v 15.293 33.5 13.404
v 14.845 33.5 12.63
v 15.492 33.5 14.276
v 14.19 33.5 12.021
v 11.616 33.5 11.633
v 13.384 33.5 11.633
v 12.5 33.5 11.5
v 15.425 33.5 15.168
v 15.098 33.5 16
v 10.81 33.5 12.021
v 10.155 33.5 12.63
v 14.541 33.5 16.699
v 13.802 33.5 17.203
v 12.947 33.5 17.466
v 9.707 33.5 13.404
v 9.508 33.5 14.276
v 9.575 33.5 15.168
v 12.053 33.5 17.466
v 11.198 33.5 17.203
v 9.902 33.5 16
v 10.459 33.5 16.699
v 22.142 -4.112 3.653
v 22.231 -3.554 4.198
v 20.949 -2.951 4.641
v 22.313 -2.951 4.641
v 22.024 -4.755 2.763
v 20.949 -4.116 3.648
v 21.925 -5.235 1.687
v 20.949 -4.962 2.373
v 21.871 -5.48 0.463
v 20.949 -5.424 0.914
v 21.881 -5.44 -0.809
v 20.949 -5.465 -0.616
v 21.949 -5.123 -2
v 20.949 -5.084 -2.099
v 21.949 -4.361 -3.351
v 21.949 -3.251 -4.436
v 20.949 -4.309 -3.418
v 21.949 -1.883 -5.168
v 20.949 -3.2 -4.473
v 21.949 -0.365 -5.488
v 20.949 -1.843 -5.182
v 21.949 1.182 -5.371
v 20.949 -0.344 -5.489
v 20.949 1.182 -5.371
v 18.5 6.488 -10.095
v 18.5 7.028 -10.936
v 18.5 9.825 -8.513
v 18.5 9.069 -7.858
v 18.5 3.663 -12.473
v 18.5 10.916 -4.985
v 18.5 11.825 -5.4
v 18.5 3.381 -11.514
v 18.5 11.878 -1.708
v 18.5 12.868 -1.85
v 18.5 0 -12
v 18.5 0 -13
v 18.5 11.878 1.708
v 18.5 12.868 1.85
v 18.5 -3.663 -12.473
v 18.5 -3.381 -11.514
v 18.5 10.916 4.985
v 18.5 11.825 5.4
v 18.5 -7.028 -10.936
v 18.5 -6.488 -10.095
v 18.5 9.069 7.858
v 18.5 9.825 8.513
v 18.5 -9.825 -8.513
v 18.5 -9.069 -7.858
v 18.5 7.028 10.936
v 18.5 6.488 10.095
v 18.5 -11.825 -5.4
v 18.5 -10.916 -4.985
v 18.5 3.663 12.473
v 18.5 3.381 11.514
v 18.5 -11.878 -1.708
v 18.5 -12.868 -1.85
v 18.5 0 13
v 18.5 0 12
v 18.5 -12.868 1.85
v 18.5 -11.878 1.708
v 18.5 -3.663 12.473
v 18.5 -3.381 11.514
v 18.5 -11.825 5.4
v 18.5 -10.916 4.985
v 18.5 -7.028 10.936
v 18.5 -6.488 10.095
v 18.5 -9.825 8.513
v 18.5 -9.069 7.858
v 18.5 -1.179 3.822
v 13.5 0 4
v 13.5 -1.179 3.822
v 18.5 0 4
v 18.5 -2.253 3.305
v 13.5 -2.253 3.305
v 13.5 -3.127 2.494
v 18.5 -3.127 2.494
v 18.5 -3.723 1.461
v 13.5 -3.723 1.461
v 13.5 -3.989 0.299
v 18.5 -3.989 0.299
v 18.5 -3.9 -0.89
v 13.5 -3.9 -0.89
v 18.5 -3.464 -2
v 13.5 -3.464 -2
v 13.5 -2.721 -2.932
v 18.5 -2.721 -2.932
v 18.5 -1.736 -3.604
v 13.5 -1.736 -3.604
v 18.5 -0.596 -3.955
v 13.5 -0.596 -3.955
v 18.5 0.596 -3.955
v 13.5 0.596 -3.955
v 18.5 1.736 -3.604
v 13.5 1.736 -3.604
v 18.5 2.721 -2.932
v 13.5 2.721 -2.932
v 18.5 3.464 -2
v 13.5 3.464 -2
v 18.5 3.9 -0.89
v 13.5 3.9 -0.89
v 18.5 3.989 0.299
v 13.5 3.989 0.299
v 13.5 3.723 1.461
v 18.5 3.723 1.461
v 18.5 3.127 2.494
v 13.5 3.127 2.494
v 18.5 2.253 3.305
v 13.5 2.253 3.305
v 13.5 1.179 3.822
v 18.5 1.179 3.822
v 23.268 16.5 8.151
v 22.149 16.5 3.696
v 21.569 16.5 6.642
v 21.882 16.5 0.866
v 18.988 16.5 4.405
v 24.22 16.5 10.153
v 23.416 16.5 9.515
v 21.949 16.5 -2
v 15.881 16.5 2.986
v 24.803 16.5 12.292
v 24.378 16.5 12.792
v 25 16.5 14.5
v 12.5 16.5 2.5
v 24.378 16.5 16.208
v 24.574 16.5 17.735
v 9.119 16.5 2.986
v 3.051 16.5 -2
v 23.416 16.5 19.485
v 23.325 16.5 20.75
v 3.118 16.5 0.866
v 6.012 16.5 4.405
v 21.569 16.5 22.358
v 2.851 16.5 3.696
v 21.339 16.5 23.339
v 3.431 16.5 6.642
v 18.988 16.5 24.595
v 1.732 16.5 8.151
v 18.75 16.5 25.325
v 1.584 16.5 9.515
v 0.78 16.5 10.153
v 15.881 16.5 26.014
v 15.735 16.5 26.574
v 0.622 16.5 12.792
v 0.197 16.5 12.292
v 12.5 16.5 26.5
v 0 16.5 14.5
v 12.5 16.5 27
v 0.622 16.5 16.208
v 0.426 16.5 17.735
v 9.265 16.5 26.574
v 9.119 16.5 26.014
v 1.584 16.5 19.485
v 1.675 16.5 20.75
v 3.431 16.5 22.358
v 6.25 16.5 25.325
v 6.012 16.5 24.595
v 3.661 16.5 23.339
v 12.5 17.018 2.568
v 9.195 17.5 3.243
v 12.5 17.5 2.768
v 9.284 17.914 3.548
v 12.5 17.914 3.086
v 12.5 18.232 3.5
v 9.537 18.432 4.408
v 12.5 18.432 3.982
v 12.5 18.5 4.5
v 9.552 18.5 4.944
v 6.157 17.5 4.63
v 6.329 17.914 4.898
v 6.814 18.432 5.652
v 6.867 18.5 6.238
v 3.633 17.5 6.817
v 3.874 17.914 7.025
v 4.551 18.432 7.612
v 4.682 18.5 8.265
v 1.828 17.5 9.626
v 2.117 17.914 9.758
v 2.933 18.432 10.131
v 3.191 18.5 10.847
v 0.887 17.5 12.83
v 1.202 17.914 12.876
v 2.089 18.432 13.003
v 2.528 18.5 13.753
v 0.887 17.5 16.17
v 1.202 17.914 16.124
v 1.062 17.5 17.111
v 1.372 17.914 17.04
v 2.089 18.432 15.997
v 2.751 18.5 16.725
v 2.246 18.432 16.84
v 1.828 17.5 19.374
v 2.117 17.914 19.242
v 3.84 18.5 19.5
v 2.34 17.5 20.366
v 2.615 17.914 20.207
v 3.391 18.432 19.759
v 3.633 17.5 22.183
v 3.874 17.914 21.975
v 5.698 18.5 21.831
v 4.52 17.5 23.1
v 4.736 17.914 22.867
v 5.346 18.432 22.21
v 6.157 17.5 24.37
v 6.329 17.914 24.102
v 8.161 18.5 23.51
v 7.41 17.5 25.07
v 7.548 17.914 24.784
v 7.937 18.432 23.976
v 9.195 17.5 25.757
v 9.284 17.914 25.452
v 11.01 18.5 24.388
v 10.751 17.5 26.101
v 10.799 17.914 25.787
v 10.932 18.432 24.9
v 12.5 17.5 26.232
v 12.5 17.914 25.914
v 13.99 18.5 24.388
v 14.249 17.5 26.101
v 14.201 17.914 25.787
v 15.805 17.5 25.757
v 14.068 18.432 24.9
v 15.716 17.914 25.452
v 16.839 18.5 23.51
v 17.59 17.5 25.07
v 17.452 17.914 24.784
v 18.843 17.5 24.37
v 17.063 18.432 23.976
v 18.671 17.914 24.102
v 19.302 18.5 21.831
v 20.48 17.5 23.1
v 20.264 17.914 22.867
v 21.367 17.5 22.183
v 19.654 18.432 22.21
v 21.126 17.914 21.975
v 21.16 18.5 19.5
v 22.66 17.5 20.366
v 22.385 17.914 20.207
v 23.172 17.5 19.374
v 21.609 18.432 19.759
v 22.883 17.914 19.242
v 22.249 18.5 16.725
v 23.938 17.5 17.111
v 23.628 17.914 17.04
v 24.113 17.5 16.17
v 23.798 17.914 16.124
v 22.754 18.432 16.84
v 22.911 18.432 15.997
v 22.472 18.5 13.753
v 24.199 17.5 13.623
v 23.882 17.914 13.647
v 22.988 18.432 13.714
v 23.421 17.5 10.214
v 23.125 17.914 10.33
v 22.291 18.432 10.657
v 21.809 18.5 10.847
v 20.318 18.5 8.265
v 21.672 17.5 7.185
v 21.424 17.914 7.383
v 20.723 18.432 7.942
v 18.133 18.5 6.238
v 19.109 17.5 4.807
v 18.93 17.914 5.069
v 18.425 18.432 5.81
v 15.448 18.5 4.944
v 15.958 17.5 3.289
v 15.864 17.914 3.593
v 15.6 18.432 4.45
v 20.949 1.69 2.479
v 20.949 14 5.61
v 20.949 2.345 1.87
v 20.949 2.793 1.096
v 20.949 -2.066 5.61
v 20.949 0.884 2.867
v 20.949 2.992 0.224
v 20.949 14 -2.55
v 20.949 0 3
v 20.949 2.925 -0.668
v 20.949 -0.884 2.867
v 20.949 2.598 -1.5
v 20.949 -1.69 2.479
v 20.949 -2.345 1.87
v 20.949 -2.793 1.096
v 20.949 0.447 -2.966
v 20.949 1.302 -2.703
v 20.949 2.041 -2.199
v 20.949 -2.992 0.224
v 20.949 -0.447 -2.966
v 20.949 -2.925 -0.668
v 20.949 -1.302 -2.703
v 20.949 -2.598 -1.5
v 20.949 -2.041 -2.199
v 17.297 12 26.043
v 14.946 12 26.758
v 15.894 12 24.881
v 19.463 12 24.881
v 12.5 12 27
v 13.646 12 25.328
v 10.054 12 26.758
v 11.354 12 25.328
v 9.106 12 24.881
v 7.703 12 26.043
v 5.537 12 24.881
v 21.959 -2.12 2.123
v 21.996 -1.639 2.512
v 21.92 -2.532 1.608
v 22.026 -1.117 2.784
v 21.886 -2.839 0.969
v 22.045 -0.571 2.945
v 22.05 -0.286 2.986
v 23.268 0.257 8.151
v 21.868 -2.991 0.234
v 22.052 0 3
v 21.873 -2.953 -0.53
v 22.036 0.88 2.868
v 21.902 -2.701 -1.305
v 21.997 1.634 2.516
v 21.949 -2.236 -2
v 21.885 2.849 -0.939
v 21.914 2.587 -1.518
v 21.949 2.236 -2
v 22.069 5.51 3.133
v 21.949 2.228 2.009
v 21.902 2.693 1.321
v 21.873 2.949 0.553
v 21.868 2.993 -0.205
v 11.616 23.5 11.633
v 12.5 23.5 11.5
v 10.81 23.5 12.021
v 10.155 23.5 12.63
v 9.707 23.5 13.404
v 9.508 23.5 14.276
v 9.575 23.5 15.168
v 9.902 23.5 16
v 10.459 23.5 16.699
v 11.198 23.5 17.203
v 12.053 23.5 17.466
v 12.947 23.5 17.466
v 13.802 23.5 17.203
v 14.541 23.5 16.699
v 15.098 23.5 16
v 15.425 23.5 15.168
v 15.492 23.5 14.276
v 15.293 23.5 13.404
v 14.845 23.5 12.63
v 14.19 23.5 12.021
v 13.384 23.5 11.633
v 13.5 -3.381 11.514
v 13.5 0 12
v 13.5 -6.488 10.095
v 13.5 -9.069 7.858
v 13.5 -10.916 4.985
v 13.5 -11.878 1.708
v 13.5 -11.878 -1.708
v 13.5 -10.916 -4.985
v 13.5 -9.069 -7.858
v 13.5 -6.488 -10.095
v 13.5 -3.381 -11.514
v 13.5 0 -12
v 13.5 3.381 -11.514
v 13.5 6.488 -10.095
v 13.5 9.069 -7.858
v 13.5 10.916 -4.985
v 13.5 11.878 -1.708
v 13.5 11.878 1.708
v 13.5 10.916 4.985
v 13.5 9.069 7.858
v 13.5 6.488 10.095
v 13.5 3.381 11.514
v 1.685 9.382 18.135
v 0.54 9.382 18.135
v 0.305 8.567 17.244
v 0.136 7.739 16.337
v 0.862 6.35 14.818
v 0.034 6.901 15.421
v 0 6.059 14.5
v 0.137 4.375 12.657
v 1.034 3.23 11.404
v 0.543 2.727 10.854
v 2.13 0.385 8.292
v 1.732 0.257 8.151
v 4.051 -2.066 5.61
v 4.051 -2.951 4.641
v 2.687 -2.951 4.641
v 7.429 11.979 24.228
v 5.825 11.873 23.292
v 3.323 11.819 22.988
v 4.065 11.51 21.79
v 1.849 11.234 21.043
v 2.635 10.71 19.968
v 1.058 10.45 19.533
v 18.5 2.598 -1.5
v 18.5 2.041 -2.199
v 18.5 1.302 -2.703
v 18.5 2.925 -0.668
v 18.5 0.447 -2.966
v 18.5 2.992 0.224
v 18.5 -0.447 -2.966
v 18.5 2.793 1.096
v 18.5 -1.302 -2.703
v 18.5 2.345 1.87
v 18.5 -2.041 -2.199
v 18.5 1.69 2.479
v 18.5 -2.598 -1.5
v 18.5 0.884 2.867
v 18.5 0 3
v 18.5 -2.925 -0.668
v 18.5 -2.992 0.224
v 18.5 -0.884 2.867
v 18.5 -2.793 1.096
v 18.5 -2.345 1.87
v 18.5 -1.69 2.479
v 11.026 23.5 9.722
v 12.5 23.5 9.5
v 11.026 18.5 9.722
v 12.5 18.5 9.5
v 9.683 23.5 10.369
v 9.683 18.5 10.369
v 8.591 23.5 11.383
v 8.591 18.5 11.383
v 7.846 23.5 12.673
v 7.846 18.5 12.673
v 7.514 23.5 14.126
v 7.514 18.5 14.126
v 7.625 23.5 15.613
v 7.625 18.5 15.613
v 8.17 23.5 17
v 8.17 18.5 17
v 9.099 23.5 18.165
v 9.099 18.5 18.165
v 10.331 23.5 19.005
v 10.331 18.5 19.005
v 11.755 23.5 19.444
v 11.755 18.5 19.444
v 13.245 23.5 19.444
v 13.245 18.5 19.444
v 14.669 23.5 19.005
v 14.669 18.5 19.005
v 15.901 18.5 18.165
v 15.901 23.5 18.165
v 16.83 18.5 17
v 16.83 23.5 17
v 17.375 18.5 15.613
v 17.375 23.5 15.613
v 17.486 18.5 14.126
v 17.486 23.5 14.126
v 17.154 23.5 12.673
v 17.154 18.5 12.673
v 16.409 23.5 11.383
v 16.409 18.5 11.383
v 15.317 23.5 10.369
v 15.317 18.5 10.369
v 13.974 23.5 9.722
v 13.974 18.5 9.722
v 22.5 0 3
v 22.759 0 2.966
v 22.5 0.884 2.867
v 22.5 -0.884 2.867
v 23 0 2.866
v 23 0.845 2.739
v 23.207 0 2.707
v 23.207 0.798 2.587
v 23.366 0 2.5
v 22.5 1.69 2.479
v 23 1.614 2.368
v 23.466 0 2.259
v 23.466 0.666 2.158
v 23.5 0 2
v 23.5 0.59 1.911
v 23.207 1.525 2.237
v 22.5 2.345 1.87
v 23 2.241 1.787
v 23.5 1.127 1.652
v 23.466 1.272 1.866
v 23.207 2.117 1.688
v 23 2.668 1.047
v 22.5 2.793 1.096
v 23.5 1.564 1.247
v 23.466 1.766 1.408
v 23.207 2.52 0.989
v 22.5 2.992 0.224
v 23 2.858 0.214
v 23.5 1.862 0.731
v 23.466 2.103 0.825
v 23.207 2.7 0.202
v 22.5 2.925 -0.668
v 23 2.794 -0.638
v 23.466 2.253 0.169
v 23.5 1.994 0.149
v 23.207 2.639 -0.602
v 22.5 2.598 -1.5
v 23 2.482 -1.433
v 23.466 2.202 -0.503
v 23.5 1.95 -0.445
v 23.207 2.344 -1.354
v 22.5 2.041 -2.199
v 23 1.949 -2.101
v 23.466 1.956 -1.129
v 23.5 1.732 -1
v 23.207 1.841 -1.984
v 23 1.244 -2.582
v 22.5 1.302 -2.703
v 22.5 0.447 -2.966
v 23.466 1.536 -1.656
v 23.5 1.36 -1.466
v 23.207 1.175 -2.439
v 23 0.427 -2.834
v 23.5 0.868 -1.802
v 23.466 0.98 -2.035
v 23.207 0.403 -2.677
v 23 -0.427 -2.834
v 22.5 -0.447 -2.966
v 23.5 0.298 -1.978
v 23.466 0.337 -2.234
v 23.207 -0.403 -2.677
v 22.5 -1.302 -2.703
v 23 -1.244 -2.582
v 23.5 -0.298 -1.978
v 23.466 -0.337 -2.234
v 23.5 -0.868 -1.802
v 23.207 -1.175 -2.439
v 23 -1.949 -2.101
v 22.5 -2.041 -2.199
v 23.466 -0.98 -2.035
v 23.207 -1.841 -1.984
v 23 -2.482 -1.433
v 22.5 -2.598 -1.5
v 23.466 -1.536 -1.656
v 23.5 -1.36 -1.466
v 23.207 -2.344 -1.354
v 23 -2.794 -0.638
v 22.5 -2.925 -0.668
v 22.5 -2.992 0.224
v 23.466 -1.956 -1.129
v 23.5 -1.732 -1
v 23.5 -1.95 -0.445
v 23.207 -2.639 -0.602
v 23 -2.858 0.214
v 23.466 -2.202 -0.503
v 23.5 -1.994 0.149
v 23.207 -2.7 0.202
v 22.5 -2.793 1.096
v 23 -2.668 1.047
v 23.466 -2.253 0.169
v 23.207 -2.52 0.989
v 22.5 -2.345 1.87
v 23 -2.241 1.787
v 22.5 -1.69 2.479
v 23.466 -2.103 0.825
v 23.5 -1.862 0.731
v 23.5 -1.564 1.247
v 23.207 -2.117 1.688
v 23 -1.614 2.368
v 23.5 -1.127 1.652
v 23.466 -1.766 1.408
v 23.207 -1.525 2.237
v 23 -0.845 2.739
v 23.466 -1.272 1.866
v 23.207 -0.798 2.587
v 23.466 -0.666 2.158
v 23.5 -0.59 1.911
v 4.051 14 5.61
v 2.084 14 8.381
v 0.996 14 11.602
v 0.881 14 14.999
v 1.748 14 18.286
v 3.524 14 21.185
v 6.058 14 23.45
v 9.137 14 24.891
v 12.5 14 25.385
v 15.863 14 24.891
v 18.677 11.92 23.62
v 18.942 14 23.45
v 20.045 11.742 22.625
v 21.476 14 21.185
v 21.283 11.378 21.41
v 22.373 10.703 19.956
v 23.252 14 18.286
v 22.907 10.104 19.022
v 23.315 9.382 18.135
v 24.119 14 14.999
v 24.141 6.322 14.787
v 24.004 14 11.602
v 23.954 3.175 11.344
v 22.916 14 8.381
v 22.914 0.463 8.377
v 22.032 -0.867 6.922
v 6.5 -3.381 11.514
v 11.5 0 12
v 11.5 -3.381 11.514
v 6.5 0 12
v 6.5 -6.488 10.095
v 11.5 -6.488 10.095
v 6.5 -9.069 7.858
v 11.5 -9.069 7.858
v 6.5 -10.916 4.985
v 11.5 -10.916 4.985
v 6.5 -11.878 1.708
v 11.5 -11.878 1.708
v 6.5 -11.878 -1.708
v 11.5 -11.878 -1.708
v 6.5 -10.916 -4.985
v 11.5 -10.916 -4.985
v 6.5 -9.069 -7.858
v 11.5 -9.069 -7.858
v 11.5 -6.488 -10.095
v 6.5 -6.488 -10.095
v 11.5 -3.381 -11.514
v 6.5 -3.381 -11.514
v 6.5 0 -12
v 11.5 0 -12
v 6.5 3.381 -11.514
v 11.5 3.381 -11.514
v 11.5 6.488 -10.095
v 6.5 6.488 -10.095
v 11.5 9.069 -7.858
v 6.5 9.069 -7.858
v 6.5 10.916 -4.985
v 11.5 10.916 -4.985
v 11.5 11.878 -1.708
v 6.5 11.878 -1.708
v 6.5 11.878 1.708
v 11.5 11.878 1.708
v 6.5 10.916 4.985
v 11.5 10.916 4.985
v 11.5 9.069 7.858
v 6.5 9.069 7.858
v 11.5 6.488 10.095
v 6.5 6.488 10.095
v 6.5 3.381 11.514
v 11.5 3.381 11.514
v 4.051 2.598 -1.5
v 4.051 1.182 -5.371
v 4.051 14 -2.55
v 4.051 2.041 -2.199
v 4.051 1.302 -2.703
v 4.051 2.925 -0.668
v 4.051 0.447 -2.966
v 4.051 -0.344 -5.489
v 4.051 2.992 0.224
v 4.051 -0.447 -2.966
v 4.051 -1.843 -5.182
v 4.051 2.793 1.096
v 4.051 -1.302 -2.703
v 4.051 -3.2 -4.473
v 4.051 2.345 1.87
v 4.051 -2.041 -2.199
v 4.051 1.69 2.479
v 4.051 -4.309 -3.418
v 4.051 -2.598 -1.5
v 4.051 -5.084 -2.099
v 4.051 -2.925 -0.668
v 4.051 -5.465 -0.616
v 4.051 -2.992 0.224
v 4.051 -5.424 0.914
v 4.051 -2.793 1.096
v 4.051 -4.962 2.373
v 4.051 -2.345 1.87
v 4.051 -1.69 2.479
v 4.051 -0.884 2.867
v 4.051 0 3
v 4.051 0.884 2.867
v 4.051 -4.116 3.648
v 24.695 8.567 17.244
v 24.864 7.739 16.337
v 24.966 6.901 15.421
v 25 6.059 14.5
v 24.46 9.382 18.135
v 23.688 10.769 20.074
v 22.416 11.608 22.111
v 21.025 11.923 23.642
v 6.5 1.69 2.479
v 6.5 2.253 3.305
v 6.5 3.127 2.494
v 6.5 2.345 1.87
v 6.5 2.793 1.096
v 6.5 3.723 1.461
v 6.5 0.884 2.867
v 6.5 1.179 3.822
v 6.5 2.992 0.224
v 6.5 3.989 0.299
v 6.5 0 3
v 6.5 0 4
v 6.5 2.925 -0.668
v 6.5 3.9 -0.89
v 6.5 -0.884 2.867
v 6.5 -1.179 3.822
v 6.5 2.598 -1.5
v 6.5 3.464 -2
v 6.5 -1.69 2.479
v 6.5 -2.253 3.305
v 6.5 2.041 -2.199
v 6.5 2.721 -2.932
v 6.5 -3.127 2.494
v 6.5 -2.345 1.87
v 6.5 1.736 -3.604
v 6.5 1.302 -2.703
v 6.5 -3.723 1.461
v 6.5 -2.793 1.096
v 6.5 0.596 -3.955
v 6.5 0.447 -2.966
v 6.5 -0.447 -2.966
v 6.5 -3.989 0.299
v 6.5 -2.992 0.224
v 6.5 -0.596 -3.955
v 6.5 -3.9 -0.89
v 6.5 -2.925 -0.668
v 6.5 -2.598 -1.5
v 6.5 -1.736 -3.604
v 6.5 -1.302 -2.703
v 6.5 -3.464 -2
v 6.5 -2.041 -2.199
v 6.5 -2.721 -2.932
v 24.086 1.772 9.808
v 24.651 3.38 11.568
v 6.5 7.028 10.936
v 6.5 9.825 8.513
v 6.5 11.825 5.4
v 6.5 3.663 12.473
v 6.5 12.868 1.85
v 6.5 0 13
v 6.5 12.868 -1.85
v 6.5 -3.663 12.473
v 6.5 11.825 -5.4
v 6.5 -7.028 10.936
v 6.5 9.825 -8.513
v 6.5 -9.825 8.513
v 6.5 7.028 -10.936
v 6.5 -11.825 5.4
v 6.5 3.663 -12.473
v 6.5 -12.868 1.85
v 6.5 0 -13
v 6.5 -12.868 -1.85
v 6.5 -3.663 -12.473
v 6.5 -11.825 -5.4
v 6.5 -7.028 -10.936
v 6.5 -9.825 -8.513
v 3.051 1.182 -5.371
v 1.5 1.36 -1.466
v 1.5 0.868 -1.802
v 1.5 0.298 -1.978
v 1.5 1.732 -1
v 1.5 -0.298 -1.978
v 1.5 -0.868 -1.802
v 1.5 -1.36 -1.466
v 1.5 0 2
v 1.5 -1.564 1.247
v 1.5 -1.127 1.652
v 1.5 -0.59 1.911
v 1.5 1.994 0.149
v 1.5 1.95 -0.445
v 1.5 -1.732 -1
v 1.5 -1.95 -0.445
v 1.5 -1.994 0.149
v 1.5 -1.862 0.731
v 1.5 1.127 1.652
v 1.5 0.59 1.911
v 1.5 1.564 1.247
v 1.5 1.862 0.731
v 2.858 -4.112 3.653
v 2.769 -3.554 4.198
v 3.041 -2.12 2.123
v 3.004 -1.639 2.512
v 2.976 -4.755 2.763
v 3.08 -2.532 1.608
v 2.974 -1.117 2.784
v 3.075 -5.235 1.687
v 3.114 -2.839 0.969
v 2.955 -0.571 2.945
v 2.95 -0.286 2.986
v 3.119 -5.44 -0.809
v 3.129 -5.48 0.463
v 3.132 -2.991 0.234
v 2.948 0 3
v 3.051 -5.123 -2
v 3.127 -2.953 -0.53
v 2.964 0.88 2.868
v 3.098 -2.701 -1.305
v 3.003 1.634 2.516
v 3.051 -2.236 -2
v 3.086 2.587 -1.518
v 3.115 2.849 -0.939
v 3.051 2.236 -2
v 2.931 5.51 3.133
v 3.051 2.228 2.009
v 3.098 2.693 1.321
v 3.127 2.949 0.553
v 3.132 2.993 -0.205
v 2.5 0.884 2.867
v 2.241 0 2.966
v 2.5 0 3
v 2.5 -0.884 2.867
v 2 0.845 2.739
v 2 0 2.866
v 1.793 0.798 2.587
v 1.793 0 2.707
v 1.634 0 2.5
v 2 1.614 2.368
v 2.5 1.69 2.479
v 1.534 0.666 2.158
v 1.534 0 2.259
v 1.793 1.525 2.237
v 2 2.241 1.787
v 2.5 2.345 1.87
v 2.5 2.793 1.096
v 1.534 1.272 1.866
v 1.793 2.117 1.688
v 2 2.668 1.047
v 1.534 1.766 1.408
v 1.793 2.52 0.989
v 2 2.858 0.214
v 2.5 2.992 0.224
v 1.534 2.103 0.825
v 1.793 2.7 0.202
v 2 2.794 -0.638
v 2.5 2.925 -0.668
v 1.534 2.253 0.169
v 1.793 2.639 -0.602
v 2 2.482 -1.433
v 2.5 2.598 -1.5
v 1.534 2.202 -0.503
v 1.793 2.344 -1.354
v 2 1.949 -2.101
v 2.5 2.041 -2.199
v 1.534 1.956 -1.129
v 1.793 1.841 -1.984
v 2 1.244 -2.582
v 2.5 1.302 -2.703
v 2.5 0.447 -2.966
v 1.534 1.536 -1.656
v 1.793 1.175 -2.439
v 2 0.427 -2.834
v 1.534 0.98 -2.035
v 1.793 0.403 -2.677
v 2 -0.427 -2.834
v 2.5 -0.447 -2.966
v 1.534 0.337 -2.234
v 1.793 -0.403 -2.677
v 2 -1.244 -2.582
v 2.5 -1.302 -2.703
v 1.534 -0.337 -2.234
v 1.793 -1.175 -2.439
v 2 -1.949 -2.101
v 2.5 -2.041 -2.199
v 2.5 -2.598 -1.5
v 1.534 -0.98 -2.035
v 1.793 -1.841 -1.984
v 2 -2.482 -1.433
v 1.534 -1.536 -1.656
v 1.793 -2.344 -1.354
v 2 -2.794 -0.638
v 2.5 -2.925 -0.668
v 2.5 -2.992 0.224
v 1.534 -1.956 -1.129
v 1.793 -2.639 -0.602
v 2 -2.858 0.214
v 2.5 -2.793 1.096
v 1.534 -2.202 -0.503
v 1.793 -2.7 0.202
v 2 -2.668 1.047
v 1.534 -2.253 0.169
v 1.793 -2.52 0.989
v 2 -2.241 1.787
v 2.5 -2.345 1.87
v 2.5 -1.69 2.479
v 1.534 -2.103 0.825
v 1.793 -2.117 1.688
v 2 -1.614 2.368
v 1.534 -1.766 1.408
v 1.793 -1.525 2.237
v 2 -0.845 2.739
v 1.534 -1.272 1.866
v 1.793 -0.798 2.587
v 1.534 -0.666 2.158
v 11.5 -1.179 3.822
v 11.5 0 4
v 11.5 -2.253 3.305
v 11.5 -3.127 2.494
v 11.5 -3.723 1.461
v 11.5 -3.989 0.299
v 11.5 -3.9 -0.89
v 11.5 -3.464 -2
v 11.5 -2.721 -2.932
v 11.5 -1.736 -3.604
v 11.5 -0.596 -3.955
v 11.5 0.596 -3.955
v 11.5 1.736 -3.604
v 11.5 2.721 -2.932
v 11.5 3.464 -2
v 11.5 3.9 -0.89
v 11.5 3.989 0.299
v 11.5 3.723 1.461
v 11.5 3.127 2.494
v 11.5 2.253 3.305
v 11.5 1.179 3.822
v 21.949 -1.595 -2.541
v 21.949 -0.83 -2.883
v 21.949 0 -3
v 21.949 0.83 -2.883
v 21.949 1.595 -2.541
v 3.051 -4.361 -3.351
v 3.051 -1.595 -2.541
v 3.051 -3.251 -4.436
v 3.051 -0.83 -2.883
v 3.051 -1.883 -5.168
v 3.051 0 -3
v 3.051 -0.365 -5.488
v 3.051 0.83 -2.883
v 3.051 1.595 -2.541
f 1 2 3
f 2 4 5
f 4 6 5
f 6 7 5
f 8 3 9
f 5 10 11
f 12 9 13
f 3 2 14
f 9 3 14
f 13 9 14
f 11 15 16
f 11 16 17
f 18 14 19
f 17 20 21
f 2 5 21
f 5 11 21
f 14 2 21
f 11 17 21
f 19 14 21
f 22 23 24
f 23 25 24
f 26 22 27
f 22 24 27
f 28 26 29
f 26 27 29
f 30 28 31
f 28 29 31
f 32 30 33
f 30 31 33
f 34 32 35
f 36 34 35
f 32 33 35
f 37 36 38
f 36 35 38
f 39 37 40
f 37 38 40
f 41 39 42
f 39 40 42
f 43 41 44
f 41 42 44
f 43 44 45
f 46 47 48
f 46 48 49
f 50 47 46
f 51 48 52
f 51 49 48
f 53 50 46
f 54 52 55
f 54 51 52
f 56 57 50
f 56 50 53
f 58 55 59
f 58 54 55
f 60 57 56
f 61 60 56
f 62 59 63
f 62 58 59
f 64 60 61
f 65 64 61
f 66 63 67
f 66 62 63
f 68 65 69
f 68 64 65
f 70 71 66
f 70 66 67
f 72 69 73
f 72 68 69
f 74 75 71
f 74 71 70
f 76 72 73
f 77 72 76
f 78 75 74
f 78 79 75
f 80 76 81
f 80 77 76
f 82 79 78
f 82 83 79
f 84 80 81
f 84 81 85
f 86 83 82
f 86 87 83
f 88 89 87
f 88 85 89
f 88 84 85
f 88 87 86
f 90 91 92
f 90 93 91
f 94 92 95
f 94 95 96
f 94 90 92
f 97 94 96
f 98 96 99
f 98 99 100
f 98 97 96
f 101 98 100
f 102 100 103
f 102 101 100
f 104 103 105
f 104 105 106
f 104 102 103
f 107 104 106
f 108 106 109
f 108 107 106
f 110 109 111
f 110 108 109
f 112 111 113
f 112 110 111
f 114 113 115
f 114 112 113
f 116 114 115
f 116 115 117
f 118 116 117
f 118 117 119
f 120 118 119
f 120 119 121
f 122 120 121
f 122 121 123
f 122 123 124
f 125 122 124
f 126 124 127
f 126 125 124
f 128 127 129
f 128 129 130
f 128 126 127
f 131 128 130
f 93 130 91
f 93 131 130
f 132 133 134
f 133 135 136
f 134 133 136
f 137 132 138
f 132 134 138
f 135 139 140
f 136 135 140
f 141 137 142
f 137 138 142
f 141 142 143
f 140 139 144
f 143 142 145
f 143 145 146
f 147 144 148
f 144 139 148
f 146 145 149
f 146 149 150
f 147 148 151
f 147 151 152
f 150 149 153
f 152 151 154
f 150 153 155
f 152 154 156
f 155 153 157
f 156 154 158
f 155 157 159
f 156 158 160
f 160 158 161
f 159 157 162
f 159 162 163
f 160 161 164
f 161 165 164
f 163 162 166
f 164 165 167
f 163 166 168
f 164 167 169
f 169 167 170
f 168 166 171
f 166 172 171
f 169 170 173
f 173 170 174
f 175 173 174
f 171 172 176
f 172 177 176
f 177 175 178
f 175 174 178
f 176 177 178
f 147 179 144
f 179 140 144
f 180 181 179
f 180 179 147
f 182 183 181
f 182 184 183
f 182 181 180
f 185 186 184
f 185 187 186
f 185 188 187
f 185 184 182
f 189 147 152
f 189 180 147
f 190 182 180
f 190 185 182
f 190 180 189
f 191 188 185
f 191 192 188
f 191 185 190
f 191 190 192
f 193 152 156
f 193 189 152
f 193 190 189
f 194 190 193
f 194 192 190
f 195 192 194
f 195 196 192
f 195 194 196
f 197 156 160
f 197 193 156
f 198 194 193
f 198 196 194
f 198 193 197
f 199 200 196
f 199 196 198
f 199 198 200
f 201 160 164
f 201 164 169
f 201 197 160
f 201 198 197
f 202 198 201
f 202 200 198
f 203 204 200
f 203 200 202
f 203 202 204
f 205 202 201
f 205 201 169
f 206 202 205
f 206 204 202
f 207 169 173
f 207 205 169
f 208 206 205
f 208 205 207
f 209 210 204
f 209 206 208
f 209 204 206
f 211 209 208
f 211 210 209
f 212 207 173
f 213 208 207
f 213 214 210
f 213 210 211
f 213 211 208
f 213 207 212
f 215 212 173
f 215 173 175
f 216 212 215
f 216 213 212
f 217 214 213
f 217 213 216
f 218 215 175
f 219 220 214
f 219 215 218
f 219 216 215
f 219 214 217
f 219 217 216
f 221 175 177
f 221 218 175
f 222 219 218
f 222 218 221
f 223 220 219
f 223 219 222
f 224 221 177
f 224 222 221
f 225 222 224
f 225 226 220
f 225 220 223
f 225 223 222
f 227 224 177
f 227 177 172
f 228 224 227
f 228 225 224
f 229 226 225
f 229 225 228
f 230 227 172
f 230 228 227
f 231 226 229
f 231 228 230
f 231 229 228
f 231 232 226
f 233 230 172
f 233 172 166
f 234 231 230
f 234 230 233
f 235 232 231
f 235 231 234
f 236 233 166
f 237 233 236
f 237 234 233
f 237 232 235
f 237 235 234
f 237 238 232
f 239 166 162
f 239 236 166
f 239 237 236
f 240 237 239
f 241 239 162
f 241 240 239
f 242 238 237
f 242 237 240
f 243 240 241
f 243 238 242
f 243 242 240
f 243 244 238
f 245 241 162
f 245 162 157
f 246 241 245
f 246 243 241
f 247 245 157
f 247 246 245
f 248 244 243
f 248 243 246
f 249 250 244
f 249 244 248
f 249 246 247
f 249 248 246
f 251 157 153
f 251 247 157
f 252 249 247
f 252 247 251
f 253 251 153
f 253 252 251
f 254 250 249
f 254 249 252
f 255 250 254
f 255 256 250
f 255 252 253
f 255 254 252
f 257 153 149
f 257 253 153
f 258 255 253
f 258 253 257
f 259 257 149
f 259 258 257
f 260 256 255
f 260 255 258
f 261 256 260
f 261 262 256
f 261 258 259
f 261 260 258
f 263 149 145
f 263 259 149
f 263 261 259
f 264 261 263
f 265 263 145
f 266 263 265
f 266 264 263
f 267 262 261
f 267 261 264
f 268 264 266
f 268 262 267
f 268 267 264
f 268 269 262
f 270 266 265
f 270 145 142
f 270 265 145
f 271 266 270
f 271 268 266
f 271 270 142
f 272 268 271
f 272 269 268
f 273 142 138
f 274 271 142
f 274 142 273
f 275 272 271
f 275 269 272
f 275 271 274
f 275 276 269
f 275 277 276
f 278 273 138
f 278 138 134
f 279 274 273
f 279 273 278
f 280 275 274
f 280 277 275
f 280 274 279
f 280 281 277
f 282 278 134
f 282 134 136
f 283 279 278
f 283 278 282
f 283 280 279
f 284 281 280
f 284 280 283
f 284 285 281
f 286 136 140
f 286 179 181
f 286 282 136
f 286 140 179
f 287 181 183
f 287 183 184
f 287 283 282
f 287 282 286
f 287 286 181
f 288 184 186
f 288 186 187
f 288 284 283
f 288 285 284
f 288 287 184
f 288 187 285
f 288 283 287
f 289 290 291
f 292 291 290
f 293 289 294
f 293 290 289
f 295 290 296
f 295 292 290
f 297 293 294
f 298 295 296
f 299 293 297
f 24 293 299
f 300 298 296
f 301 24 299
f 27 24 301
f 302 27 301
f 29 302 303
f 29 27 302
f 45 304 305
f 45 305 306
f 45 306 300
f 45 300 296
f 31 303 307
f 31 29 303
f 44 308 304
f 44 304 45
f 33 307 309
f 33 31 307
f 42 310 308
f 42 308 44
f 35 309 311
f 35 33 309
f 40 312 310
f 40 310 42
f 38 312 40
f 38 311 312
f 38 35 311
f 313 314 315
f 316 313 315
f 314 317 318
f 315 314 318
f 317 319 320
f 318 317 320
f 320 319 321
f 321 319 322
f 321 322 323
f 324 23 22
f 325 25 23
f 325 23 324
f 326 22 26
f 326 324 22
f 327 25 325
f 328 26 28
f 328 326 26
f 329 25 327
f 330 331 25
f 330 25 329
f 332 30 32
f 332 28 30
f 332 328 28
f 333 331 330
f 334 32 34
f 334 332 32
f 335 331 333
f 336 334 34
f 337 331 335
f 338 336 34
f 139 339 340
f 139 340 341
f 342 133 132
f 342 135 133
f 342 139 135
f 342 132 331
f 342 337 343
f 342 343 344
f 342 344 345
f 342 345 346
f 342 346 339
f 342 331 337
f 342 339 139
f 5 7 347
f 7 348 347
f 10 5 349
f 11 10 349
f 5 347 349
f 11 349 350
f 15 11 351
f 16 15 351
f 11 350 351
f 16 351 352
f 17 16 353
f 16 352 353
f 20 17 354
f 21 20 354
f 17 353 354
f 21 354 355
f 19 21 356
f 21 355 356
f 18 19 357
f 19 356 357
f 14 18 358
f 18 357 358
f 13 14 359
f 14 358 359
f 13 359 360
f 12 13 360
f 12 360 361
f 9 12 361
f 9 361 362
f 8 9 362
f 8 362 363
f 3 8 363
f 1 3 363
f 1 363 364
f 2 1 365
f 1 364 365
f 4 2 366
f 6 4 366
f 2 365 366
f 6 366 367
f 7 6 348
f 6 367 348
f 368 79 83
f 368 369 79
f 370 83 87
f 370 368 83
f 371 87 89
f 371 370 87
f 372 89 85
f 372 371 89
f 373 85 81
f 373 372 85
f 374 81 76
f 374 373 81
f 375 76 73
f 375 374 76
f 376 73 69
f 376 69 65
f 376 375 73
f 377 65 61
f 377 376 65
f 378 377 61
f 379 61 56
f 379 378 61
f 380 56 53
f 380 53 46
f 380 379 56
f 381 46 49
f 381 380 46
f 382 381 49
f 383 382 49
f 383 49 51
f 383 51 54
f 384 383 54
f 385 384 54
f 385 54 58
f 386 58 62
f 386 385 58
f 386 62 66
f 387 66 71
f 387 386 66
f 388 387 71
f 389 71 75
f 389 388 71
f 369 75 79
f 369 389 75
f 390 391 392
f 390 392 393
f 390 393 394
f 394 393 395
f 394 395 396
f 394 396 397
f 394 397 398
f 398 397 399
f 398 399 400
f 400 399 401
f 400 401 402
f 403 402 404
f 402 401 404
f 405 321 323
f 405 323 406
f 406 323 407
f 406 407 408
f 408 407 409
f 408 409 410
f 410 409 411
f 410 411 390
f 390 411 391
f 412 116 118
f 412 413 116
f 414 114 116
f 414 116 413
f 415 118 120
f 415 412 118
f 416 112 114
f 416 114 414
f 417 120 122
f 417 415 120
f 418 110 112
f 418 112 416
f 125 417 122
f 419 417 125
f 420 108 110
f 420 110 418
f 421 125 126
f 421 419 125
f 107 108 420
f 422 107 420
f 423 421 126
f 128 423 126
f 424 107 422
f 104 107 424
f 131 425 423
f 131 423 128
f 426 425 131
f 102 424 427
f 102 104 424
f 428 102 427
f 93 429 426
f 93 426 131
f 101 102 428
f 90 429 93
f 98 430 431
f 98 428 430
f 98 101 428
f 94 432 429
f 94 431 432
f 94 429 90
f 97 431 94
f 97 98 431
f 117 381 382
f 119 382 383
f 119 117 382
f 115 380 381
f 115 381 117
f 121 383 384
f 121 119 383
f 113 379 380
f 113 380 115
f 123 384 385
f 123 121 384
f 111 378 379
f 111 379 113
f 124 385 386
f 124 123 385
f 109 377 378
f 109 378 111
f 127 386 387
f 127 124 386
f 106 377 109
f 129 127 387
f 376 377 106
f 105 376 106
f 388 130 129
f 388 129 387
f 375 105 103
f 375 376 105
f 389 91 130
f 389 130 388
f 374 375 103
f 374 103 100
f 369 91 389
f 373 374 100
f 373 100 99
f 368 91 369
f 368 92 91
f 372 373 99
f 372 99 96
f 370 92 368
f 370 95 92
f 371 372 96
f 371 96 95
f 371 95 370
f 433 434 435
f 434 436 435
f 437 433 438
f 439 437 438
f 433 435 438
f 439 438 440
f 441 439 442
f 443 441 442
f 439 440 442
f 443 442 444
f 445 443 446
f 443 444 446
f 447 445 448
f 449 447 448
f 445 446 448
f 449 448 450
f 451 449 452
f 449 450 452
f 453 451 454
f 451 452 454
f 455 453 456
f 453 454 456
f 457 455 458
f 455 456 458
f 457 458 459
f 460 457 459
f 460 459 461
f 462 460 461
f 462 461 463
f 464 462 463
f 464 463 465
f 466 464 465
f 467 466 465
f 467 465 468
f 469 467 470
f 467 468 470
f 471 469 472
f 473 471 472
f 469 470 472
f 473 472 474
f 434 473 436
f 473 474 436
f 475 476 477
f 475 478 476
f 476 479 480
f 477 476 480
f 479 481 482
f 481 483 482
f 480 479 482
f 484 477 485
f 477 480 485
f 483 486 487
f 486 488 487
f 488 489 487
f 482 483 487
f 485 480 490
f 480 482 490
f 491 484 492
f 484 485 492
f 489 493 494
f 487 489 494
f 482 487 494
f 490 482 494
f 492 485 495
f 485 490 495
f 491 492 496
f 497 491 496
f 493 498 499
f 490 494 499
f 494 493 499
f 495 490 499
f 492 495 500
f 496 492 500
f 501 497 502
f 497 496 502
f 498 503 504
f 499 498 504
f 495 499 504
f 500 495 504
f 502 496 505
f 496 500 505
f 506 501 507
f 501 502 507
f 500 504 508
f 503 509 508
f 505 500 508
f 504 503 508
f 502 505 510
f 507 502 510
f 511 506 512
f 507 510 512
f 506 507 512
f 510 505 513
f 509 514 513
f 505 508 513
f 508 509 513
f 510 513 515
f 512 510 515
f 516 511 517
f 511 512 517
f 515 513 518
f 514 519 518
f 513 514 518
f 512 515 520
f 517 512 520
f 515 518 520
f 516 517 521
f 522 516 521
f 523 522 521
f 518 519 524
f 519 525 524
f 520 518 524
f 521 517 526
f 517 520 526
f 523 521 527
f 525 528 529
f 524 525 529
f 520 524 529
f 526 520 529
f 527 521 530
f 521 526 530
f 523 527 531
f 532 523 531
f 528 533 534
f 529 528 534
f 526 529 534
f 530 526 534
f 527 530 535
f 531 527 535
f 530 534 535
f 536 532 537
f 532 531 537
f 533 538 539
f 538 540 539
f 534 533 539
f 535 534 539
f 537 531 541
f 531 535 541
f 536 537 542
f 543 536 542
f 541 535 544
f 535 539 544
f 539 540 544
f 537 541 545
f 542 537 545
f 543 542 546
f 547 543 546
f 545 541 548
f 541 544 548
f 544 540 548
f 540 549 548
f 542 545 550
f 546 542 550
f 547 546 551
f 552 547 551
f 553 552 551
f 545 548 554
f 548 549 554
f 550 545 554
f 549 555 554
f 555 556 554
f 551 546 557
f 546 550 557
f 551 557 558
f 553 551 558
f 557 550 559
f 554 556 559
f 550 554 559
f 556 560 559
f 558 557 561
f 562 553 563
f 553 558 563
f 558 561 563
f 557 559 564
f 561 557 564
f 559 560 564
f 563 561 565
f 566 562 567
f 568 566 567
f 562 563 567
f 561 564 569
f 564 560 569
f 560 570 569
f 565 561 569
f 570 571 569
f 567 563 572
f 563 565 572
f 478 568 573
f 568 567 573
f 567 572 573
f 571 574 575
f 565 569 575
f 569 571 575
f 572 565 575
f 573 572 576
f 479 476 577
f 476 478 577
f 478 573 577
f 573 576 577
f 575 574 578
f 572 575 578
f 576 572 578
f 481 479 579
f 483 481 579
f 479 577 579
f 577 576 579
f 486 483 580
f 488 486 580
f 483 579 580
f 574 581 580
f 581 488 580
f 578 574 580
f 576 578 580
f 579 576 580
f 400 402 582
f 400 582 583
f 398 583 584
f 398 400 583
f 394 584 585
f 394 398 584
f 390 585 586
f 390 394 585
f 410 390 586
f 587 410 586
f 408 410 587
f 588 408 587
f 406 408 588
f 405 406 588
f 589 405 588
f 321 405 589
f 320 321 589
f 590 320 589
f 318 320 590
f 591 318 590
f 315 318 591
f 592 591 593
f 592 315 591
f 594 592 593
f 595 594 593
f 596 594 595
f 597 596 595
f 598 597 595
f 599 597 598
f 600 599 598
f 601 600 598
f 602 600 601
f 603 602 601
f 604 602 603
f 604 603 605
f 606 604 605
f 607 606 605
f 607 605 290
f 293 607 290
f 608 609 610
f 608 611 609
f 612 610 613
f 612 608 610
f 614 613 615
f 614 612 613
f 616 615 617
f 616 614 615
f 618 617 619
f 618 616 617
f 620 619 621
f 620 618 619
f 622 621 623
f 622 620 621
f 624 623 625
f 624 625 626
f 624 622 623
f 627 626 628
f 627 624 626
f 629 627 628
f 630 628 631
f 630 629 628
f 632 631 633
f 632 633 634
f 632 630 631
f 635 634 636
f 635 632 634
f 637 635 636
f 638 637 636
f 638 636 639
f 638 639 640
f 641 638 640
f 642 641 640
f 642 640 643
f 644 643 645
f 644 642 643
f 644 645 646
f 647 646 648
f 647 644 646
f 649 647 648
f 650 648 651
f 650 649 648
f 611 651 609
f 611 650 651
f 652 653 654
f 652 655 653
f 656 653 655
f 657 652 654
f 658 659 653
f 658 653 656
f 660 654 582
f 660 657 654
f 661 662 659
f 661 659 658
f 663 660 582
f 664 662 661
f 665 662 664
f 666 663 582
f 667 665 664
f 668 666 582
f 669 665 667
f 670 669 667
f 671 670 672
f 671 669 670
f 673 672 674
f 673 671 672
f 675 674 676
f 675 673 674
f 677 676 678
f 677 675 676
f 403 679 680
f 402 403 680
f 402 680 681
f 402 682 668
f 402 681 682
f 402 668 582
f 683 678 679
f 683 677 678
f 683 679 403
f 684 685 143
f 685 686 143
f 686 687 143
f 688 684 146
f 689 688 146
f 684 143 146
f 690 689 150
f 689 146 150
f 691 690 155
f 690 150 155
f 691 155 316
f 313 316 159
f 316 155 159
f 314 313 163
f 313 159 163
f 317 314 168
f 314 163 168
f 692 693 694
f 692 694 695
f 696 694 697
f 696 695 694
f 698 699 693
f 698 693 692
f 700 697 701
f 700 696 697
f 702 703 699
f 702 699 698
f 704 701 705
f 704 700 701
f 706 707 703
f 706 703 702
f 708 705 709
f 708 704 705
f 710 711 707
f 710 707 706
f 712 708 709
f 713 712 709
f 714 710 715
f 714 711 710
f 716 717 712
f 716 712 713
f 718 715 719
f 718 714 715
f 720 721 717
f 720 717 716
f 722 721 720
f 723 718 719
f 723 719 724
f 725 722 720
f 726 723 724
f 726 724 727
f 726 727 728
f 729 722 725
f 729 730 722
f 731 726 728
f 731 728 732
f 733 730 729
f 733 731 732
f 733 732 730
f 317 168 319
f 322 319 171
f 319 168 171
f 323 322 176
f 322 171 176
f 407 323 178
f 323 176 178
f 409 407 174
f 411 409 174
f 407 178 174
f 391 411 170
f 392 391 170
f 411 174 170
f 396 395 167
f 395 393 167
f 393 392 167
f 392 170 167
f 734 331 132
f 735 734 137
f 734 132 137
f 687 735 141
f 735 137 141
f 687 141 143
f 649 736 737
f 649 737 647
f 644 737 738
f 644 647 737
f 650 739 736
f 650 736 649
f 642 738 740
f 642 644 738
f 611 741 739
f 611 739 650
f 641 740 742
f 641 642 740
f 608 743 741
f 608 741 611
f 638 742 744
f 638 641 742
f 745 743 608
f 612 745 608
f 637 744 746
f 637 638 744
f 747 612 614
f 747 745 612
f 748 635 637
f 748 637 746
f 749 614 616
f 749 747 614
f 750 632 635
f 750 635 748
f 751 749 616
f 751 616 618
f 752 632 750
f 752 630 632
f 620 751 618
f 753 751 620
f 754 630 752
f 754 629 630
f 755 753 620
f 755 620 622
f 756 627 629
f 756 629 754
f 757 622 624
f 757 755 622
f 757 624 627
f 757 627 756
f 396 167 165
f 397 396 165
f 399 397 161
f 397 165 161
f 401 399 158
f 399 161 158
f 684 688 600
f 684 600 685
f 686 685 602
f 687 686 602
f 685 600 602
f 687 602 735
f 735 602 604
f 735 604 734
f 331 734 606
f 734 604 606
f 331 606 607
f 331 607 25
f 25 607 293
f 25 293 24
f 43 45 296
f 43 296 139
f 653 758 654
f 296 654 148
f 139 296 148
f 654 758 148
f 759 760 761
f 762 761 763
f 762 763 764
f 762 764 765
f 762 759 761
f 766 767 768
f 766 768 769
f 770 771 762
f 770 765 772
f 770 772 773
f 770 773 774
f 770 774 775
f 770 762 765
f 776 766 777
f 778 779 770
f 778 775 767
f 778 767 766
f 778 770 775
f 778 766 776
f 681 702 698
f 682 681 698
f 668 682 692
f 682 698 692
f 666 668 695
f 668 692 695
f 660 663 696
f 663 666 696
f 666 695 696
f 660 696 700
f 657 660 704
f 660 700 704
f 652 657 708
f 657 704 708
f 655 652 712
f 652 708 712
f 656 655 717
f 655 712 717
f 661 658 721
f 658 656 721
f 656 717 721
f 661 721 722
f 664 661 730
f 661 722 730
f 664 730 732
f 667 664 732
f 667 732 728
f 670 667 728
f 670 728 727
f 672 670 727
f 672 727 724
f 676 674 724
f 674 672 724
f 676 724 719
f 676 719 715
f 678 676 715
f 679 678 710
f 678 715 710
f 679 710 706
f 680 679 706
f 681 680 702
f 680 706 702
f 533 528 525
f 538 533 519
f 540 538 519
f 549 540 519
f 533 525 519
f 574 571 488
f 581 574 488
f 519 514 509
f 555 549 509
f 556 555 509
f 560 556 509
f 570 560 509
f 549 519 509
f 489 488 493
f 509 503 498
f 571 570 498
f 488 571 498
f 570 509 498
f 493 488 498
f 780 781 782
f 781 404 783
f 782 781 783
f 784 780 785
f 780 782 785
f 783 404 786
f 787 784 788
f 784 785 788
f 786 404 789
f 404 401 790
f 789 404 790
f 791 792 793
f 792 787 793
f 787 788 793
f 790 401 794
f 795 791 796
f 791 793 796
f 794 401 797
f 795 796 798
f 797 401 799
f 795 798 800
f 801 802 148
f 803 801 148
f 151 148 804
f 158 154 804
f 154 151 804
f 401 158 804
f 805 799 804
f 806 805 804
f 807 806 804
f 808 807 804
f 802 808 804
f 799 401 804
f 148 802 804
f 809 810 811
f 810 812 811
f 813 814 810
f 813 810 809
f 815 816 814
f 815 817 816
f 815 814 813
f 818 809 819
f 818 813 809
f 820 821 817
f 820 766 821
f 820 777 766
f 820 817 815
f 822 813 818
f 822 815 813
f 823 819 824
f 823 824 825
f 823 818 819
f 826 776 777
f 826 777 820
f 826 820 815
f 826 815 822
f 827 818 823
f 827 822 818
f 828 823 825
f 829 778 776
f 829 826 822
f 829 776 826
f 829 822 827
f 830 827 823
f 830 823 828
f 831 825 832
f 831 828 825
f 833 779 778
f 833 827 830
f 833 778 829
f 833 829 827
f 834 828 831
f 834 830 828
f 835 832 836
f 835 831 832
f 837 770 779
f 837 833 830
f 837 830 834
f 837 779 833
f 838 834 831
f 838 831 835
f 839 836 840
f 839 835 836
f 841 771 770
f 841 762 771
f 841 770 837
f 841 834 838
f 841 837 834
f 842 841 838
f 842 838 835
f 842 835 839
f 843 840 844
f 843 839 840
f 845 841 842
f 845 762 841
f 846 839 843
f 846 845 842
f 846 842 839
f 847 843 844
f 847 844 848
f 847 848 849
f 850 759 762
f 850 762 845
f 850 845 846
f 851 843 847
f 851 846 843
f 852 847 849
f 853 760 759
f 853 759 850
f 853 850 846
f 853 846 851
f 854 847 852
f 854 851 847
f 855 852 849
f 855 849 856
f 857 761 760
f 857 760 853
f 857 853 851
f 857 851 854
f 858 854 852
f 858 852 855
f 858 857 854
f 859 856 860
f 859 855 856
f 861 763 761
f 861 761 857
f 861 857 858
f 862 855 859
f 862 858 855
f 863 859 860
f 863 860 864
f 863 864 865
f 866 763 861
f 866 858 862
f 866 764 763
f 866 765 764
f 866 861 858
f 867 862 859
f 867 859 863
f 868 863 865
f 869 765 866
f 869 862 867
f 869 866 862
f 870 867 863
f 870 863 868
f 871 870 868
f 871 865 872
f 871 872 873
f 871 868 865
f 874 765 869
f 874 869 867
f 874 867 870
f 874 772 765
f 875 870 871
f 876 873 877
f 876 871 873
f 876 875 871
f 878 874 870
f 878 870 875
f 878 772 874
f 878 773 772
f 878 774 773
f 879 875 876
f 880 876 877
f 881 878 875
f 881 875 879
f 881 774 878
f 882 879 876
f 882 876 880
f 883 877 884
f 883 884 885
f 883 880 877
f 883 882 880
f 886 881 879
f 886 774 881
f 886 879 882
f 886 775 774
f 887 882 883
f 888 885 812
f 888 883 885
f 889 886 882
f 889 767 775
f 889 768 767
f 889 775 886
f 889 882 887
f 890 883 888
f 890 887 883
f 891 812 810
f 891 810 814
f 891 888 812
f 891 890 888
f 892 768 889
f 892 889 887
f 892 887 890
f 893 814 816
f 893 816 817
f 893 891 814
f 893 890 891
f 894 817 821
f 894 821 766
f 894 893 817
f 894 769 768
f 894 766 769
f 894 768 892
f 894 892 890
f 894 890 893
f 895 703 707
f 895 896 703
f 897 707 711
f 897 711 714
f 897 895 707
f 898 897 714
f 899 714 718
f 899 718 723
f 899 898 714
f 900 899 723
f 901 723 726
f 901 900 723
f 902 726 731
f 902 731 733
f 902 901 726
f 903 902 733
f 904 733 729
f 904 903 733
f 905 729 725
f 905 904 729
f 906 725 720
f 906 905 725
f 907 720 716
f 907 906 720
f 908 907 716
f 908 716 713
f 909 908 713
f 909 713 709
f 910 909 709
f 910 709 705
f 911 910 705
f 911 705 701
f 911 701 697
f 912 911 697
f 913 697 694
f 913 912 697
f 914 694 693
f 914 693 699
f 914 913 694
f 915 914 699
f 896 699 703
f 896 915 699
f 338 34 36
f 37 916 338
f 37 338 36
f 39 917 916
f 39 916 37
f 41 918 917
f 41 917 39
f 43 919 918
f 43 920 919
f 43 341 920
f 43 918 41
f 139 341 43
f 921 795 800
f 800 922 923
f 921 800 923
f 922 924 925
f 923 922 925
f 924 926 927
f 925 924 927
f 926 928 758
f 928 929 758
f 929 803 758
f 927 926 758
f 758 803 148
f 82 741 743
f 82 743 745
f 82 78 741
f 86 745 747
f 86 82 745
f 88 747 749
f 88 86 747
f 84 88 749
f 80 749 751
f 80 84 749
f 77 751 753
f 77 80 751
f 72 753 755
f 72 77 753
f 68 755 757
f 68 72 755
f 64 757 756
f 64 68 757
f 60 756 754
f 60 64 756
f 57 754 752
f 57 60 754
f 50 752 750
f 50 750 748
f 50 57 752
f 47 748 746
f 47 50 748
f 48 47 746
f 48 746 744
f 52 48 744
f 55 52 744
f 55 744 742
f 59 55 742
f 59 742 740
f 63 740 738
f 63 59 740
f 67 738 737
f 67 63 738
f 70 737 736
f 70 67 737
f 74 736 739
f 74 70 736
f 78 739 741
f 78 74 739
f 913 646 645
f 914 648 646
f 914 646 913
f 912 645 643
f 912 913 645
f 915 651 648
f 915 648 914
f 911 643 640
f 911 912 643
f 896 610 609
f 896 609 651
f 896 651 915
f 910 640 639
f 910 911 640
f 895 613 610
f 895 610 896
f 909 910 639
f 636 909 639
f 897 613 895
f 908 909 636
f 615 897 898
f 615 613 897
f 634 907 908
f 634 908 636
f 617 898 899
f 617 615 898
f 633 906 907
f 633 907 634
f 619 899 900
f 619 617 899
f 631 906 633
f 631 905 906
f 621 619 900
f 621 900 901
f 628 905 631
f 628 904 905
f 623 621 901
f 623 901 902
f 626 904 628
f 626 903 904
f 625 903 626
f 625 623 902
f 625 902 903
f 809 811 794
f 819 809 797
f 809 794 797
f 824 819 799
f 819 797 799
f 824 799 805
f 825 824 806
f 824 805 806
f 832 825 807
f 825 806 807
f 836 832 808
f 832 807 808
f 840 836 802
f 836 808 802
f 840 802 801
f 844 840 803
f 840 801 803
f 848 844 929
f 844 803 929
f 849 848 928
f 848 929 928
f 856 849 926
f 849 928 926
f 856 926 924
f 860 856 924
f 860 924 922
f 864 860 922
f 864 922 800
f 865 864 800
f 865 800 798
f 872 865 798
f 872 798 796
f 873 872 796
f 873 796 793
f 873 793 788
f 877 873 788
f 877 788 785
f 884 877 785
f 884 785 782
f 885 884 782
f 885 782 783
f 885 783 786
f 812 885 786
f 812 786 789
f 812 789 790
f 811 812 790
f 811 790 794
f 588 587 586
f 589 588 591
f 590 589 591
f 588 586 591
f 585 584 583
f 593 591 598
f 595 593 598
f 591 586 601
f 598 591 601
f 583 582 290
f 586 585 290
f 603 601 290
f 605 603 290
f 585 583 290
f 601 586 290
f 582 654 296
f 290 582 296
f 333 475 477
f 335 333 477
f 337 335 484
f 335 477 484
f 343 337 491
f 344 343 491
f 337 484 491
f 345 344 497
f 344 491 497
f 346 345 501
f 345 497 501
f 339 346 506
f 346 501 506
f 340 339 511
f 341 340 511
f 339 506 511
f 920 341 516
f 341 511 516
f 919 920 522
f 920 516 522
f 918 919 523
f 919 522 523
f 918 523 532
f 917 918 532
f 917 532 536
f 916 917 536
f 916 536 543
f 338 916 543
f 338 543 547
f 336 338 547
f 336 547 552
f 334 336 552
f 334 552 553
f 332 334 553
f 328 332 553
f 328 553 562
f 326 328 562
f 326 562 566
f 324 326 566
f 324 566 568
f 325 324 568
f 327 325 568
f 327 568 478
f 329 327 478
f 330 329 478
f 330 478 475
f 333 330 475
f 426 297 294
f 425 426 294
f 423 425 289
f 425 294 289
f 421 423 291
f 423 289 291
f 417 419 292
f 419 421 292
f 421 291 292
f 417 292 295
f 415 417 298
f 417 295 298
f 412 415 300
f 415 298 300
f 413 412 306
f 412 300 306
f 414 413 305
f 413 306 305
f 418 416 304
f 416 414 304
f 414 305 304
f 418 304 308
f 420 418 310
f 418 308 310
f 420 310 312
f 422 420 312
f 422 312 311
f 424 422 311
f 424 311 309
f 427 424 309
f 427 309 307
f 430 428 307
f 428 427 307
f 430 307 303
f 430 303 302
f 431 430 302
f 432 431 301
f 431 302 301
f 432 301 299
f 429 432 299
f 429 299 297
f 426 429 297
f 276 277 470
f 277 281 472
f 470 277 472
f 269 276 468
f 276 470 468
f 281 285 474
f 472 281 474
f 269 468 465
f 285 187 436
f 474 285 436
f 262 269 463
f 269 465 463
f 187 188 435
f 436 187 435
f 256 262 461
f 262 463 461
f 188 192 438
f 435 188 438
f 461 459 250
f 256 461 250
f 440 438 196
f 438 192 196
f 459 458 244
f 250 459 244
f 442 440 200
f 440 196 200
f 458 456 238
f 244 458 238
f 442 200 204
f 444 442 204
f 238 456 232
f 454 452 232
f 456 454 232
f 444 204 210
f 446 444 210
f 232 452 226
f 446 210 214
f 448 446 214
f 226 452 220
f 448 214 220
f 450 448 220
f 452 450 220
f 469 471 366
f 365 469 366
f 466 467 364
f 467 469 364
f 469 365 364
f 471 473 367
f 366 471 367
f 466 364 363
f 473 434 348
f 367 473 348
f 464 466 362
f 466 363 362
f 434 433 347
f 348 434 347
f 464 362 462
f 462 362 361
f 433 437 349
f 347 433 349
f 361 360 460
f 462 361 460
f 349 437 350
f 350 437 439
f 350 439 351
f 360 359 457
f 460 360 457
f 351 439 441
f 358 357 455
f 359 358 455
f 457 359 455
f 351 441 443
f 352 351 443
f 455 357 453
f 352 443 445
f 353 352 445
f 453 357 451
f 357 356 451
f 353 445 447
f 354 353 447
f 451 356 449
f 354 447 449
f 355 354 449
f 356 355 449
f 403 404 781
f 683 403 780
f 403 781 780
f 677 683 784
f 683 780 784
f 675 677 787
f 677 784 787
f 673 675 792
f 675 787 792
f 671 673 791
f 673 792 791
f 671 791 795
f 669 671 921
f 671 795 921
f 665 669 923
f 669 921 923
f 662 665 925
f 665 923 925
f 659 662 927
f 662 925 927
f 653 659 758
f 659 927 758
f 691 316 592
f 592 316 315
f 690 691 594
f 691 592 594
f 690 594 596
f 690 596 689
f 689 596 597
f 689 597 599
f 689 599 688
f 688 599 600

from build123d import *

# Parameters (mm, degrees)
BASE_DEPTH             = 25
ESQUISSE2_W            = 3.051401781
ESQUISSE2_H            = 3.671186171
VIDE_BASE_DEPTH        = 25
CONG_2_R               = 2
VIDE_BASE_2_DEPTH      = 14
VIDE_BASE_2_DEPTH_BACK = 14
AXE_ROUE_DEPTH         = 11
AXE_ROUE_DEPTH_BACK    = 11
ESQUISSE7_R            = 3
CONGE_VIS_1_R          = 1
CONGE_VIS_2_R          = 1


with BuildPart() as part:
    # Esquisse1 → BASE (new body)
    with BuildSketch(Plane(origin=(0, 0, 0), x_dir=(0, 0, -1), z_dir=(1, 0, 0))):
        with BuildLine():
            Line((5.371432156, 1.182250648), (2, 16.5))
            Line((2, 16.5), (-27, 16.5))
            Line((-27, 16.5), (-27, 12))
            Line((-27, 12), (-24.881319015, 12))
            ThreePointArc((-24.881319015, 12), (-21.262987094, 11.322428552), (-18.134990853, 9.381534822))
            Line((-18.134990853, 9.381534822), (-4.641317523, -2.950961141))
            ThreePointArc((-4.641317523, -2.950961141), (2.098601145, -5.083883676), (5.371432156, 1.182250648))
        make_face()
    extrude(amount=BASE_DEPTH)

    # Esquisse2 → VIDE BASE (cut)
    with BuildSketch(Plane(origin=(0, 16.5, 0), x_dir=(1, 0, 0), z_dir=(0, 1, 0))):
        with BuildLine():
            Line((25, 2), (21.948598219, 2))
            add(Edge.make_bspline(
                [(23.267838517, -8.151484137), (21.529216313, -3.190142242), (21.948598219, 2)],
                knots=[0, 0, 0, 1, 1, 1], degree=2))
            ThreePointArc((23.267838517, -8.151484137), (24.559186985, -11.209709851), (25, -14.5))
            Line((25, -14.5), (25, 2))
        make_face()
        with Locations((23.47429911, 3.835593086)):
            Rectangle(ESQUISSE2_W, ESQUISSE2_H)
        with Locations((1.525700891, 3.835593086)):
            Rectangle(ESQUISSE2_W, ESQUISSE2_H)
        with BuildLine():
            add(Edge.make_bspline(
                [(1.732161483, -8.151484137), (3.470783687, -3.190142242), (3.051401781, 2)],
                knots=[0, 0, 0, 1, 1, 1], degree=2))
            Line((3.051401781, 2), (0, 2))
            Line((0, 2), (0, -14.49999997))
            ThreePointArc((0, -14.49999997), (0.440813019, -11.209709836), (1.732161483, -8.151484137))
        make_face()
        with BuildLine():
            Line((0, -27), (12.5, -27))
            ThreePointArc((12.5, -27), (3.661165225, -23.338834754), (0, -14.49999997))
            Line((0, -14.49999997), (0, -27))
        make_face()
        with BuildLine():
            Line((25, -27), (25, -14.5))
            ThreePointArc((25, -14.5), (21.338834765, -23.338834765), (12.5, -27))
            Line((12.5, -27), (25, -27))
        make_face()
    extrude(amount=-VIDE_BASE_DEPTH, mode=Mode.SUBTRACT)

    # Esquisse4 → VIS (revolve)
    with BuildSketch(Plane.ZY.offset(-12.5), mode=Mode.PRIVATE) as vis_sk:
        Polygon((14.5, 16.5), (14.5, 33.5), (17.5, 33.5), (17.5, 23.5), (19.5, 23.5), (19.5, 18.5), (26.5, 18.5), (26.5, 16.5), align=None)
    revolve(vis_sk.sketch.rotate(Axis((12.5, 16.5, 14.5), (0, 1, 0)), 180), axis=Axis((12.5, 16.5, 14.5), (0, 1, 0)))

    # Congé2
    cong_2_edges = [part.edges().sort_by_distance(p)[0] for p in [
        (12.5, 18.5, 26.5),
    ]]
    fillet(cong_2_edges, radius=CONG_2_R - 0.0001)  # a hair under: the kernel refuses the full size

    # Esquisse6 → VIDE BASE 2 (cut, two sides: drawn at the far end of the back side and taken through both)
    with BuildSketch(Plane(origin=(0, 0, 0), x_dir=(1, 0, 0), z_dir=(0, 1, 0)).offset(-VIDE_BASE_2_DEPTH_BACK)):
        with BuildLine():
            Line((4.051401781, 5.5), (4.051401781, -5.609523223))
            ThreePointArc((4.051401781, -5.609523223), (12.5, -25.384659014), (20.948598219, -5.609523223))
            Line((20.948598219, -5.609523223), (20.948598219, 5.5))
            Line((20.948598219, 5.5), (4.051401781, 5.5))
        make_face()
    extrude(amount=VIDE_BASE_2_DEPTH + VIDE_BASE_2_DEPTH_BACK, mode=Mode.SUBTRACT)

    # Esquisse7 → AXE ROUE (add, two sides: drawn at the far end of the back side and taken through both)
    with BuildSketch(Plane.ZY.offset(-12.5).offset(-AXE_ROUE_DEPTH_BACK)):
        Circle(ESQUISSE7_R)
    extrude(amount=AXE_ROUE_DEPTH + AXE_ROUE_DEPTH_BACK)

    # CONGE VIS 1
    conge_vis_1_edges = [part.edges().sort_by_distance(p)[0] for p in [
        (23.5, 0, -3),
    ]]
    fillet(conge_vis_1_edges, radius=CONGE_VIS_1_R)

    # CONGE VIS 2
    conge_vis_2_edges = [part.edges().sort_by_distance(p)[0] for p in [
        (1.5, 0, -3),
    ]]
    fillet(conge_vis_2_edges, radius=CONGE_VIS_2_R)

    # Esquisse9 → ROUE (revolve)
    with BuildSketch(Plane(origin=(0, 0, 0), x_dir=(1, 0, 0), z_dir=(0, 1, 0))):
        Polygon((18.5, -4), (18.5, -3), (6.5, -3), (6.5, -4), (11.5, -4), (11.5, -12), (6.5, -12), (6.5, -13), (18.5, -13), (18.5, -12), (13.5, -12), (13.5, -4), align=None)
    revolve(axis=Axis((7.793426375, 0, 0), (1, 0, 0)))


solid = part.part
